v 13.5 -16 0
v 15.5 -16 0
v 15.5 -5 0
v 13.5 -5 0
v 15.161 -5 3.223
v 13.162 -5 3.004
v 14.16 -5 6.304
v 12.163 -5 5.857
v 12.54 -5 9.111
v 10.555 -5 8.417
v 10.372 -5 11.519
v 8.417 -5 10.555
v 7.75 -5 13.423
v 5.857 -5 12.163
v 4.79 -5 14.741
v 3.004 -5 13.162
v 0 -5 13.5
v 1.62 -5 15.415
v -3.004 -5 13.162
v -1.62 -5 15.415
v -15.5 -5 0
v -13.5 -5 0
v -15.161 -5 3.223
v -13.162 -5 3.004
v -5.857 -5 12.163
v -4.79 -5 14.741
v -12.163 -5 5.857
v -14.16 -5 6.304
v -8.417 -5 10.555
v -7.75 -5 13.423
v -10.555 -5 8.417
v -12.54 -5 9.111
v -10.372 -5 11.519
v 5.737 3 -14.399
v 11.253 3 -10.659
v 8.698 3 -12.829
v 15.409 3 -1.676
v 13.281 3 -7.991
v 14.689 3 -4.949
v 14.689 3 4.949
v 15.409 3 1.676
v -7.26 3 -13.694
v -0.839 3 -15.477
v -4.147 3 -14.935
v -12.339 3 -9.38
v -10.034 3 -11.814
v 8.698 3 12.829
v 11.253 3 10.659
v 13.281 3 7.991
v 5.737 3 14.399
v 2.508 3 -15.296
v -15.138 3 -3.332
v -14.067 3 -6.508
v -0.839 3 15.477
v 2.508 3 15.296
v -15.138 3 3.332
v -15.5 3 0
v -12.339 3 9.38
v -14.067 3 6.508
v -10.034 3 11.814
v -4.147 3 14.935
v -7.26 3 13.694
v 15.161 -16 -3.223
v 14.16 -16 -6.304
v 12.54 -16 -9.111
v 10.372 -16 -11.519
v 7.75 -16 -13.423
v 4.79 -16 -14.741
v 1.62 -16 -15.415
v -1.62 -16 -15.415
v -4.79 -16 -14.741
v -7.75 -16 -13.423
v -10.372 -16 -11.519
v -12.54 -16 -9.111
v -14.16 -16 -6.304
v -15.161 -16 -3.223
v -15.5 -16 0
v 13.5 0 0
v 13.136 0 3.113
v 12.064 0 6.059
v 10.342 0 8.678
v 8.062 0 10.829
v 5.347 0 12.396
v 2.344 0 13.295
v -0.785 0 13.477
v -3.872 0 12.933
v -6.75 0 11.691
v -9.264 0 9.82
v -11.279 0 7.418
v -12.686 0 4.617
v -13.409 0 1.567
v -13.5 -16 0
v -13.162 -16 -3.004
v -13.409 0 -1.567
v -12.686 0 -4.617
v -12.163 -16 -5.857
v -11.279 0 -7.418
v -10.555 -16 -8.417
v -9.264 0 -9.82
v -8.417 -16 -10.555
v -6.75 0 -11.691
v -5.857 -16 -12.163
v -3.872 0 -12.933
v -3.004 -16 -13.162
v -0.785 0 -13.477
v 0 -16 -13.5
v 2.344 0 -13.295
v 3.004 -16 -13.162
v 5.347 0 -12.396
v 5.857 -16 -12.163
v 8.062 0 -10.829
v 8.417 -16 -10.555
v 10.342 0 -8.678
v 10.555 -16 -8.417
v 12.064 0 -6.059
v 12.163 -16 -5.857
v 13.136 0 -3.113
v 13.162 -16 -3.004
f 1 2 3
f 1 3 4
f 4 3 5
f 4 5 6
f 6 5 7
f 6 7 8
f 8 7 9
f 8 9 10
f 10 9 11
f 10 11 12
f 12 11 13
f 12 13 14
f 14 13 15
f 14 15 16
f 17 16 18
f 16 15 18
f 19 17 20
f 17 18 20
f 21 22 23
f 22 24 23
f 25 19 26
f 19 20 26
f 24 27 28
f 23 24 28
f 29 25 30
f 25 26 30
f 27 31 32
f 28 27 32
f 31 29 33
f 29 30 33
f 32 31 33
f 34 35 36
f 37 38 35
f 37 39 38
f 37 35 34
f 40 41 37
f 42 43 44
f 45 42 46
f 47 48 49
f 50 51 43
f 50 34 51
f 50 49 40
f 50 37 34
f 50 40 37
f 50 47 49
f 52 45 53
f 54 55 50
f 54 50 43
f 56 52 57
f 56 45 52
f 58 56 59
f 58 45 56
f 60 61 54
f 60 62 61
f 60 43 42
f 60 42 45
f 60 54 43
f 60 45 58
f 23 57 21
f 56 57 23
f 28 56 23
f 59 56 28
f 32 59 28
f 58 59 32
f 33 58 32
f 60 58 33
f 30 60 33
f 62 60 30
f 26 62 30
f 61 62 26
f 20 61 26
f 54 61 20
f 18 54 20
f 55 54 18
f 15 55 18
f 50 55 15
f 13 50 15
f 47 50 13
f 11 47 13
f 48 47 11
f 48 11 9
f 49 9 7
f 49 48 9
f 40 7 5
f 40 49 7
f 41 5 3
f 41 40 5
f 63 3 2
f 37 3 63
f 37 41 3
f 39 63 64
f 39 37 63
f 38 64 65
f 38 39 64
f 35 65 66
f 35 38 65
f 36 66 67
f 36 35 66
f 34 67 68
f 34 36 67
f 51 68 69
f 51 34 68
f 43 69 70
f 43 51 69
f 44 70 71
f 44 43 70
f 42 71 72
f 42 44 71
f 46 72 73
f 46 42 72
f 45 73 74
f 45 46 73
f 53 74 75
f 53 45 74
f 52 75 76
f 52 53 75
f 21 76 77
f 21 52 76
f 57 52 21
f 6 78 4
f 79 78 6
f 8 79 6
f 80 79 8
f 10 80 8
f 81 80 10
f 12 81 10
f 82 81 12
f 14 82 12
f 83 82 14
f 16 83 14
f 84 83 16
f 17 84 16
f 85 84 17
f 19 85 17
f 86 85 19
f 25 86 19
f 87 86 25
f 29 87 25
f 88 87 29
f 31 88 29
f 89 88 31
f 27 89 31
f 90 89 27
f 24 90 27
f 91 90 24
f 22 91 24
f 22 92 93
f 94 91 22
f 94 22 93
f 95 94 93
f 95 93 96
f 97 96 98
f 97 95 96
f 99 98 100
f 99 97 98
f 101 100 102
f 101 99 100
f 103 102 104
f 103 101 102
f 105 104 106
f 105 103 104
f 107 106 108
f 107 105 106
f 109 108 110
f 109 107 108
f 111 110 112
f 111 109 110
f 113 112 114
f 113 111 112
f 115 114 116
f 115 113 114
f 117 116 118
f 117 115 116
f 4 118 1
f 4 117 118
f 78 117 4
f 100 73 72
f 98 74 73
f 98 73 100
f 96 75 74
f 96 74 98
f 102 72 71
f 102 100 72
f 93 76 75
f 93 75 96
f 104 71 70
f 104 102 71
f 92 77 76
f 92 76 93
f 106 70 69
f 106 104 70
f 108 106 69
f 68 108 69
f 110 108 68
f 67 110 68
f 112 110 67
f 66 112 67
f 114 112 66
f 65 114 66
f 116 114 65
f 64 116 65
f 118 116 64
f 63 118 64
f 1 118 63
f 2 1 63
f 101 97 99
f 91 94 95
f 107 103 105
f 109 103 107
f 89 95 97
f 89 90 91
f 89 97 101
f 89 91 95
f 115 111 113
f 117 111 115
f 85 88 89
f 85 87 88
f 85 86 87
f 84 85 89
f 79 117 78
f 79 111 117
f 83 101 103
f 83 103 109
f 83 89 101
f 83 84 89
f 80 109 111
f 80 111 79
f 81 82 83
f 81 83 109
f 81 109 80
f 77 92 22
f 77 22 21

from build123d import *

# Parameters (mm, degrees)
F1_DEPTH = 16
F2_DEPTH = 3
F4_DEPTH = 8


with BuildPart() as f1:
    # F0 (on Front) → F1 (new body)
    with BuildSketch(Plane.XZ):
        with BuildLine():
            Line((15.5, 0), (13.5, 0))
            ThreePointArc((13.5, 0), (0, -13.5), (-13.5, 0))
            Line((-13.5, 0), (-15.5, 0))
            ThreePointArc((-15.5, 0), (0, -15.5), (15.5, 0))
        make_face()
    extrude(amount=F1_DEPTH)

    # F0 (on Front) → F2 (join)
    with BuildSketch(Plane.XZ):
        with BuildLine():
            Line((15.5, 0), (13.5, 0))
            ThreePointArc((13.5, 0), (0, -13.5), (-13.5, 0))
            Line((-13.5, 0), (-15.5, 0))
            ThreePointArc((-15.5, 0), (0, -15.5), (15.5, 0))
        make_face()
        with BuildLine():
            ThreePointArc((-13.5, 0), (0, -13.5), (13.5, 0))
            ThreePointArc((13.5, 0), (0, 13.5), (-13.5, 0))
        make_face()
    extrude(amount=-F2_DEPTH)

    # F3 (on face) → F4 (join)
    with BuildSketch(Plane(origin=(0, 3, 0), x_dir=(-1, 0, 0), z_dir=(0, 1, 0))):
        with BuildLine():
            Line((13.5, 0), (15.5, 0))
            ThreePointArc((15.5, 0), (0, 15.5), (-15.5, 0))
            Line((-15.5, 0), (-13.5, 0))
            ThreePointArc((-13.5, 0), (0, 13.5), (13.5, 0))
        make_face()
    extrude(amount=-F4_DEPTH)


solid = f1.part
